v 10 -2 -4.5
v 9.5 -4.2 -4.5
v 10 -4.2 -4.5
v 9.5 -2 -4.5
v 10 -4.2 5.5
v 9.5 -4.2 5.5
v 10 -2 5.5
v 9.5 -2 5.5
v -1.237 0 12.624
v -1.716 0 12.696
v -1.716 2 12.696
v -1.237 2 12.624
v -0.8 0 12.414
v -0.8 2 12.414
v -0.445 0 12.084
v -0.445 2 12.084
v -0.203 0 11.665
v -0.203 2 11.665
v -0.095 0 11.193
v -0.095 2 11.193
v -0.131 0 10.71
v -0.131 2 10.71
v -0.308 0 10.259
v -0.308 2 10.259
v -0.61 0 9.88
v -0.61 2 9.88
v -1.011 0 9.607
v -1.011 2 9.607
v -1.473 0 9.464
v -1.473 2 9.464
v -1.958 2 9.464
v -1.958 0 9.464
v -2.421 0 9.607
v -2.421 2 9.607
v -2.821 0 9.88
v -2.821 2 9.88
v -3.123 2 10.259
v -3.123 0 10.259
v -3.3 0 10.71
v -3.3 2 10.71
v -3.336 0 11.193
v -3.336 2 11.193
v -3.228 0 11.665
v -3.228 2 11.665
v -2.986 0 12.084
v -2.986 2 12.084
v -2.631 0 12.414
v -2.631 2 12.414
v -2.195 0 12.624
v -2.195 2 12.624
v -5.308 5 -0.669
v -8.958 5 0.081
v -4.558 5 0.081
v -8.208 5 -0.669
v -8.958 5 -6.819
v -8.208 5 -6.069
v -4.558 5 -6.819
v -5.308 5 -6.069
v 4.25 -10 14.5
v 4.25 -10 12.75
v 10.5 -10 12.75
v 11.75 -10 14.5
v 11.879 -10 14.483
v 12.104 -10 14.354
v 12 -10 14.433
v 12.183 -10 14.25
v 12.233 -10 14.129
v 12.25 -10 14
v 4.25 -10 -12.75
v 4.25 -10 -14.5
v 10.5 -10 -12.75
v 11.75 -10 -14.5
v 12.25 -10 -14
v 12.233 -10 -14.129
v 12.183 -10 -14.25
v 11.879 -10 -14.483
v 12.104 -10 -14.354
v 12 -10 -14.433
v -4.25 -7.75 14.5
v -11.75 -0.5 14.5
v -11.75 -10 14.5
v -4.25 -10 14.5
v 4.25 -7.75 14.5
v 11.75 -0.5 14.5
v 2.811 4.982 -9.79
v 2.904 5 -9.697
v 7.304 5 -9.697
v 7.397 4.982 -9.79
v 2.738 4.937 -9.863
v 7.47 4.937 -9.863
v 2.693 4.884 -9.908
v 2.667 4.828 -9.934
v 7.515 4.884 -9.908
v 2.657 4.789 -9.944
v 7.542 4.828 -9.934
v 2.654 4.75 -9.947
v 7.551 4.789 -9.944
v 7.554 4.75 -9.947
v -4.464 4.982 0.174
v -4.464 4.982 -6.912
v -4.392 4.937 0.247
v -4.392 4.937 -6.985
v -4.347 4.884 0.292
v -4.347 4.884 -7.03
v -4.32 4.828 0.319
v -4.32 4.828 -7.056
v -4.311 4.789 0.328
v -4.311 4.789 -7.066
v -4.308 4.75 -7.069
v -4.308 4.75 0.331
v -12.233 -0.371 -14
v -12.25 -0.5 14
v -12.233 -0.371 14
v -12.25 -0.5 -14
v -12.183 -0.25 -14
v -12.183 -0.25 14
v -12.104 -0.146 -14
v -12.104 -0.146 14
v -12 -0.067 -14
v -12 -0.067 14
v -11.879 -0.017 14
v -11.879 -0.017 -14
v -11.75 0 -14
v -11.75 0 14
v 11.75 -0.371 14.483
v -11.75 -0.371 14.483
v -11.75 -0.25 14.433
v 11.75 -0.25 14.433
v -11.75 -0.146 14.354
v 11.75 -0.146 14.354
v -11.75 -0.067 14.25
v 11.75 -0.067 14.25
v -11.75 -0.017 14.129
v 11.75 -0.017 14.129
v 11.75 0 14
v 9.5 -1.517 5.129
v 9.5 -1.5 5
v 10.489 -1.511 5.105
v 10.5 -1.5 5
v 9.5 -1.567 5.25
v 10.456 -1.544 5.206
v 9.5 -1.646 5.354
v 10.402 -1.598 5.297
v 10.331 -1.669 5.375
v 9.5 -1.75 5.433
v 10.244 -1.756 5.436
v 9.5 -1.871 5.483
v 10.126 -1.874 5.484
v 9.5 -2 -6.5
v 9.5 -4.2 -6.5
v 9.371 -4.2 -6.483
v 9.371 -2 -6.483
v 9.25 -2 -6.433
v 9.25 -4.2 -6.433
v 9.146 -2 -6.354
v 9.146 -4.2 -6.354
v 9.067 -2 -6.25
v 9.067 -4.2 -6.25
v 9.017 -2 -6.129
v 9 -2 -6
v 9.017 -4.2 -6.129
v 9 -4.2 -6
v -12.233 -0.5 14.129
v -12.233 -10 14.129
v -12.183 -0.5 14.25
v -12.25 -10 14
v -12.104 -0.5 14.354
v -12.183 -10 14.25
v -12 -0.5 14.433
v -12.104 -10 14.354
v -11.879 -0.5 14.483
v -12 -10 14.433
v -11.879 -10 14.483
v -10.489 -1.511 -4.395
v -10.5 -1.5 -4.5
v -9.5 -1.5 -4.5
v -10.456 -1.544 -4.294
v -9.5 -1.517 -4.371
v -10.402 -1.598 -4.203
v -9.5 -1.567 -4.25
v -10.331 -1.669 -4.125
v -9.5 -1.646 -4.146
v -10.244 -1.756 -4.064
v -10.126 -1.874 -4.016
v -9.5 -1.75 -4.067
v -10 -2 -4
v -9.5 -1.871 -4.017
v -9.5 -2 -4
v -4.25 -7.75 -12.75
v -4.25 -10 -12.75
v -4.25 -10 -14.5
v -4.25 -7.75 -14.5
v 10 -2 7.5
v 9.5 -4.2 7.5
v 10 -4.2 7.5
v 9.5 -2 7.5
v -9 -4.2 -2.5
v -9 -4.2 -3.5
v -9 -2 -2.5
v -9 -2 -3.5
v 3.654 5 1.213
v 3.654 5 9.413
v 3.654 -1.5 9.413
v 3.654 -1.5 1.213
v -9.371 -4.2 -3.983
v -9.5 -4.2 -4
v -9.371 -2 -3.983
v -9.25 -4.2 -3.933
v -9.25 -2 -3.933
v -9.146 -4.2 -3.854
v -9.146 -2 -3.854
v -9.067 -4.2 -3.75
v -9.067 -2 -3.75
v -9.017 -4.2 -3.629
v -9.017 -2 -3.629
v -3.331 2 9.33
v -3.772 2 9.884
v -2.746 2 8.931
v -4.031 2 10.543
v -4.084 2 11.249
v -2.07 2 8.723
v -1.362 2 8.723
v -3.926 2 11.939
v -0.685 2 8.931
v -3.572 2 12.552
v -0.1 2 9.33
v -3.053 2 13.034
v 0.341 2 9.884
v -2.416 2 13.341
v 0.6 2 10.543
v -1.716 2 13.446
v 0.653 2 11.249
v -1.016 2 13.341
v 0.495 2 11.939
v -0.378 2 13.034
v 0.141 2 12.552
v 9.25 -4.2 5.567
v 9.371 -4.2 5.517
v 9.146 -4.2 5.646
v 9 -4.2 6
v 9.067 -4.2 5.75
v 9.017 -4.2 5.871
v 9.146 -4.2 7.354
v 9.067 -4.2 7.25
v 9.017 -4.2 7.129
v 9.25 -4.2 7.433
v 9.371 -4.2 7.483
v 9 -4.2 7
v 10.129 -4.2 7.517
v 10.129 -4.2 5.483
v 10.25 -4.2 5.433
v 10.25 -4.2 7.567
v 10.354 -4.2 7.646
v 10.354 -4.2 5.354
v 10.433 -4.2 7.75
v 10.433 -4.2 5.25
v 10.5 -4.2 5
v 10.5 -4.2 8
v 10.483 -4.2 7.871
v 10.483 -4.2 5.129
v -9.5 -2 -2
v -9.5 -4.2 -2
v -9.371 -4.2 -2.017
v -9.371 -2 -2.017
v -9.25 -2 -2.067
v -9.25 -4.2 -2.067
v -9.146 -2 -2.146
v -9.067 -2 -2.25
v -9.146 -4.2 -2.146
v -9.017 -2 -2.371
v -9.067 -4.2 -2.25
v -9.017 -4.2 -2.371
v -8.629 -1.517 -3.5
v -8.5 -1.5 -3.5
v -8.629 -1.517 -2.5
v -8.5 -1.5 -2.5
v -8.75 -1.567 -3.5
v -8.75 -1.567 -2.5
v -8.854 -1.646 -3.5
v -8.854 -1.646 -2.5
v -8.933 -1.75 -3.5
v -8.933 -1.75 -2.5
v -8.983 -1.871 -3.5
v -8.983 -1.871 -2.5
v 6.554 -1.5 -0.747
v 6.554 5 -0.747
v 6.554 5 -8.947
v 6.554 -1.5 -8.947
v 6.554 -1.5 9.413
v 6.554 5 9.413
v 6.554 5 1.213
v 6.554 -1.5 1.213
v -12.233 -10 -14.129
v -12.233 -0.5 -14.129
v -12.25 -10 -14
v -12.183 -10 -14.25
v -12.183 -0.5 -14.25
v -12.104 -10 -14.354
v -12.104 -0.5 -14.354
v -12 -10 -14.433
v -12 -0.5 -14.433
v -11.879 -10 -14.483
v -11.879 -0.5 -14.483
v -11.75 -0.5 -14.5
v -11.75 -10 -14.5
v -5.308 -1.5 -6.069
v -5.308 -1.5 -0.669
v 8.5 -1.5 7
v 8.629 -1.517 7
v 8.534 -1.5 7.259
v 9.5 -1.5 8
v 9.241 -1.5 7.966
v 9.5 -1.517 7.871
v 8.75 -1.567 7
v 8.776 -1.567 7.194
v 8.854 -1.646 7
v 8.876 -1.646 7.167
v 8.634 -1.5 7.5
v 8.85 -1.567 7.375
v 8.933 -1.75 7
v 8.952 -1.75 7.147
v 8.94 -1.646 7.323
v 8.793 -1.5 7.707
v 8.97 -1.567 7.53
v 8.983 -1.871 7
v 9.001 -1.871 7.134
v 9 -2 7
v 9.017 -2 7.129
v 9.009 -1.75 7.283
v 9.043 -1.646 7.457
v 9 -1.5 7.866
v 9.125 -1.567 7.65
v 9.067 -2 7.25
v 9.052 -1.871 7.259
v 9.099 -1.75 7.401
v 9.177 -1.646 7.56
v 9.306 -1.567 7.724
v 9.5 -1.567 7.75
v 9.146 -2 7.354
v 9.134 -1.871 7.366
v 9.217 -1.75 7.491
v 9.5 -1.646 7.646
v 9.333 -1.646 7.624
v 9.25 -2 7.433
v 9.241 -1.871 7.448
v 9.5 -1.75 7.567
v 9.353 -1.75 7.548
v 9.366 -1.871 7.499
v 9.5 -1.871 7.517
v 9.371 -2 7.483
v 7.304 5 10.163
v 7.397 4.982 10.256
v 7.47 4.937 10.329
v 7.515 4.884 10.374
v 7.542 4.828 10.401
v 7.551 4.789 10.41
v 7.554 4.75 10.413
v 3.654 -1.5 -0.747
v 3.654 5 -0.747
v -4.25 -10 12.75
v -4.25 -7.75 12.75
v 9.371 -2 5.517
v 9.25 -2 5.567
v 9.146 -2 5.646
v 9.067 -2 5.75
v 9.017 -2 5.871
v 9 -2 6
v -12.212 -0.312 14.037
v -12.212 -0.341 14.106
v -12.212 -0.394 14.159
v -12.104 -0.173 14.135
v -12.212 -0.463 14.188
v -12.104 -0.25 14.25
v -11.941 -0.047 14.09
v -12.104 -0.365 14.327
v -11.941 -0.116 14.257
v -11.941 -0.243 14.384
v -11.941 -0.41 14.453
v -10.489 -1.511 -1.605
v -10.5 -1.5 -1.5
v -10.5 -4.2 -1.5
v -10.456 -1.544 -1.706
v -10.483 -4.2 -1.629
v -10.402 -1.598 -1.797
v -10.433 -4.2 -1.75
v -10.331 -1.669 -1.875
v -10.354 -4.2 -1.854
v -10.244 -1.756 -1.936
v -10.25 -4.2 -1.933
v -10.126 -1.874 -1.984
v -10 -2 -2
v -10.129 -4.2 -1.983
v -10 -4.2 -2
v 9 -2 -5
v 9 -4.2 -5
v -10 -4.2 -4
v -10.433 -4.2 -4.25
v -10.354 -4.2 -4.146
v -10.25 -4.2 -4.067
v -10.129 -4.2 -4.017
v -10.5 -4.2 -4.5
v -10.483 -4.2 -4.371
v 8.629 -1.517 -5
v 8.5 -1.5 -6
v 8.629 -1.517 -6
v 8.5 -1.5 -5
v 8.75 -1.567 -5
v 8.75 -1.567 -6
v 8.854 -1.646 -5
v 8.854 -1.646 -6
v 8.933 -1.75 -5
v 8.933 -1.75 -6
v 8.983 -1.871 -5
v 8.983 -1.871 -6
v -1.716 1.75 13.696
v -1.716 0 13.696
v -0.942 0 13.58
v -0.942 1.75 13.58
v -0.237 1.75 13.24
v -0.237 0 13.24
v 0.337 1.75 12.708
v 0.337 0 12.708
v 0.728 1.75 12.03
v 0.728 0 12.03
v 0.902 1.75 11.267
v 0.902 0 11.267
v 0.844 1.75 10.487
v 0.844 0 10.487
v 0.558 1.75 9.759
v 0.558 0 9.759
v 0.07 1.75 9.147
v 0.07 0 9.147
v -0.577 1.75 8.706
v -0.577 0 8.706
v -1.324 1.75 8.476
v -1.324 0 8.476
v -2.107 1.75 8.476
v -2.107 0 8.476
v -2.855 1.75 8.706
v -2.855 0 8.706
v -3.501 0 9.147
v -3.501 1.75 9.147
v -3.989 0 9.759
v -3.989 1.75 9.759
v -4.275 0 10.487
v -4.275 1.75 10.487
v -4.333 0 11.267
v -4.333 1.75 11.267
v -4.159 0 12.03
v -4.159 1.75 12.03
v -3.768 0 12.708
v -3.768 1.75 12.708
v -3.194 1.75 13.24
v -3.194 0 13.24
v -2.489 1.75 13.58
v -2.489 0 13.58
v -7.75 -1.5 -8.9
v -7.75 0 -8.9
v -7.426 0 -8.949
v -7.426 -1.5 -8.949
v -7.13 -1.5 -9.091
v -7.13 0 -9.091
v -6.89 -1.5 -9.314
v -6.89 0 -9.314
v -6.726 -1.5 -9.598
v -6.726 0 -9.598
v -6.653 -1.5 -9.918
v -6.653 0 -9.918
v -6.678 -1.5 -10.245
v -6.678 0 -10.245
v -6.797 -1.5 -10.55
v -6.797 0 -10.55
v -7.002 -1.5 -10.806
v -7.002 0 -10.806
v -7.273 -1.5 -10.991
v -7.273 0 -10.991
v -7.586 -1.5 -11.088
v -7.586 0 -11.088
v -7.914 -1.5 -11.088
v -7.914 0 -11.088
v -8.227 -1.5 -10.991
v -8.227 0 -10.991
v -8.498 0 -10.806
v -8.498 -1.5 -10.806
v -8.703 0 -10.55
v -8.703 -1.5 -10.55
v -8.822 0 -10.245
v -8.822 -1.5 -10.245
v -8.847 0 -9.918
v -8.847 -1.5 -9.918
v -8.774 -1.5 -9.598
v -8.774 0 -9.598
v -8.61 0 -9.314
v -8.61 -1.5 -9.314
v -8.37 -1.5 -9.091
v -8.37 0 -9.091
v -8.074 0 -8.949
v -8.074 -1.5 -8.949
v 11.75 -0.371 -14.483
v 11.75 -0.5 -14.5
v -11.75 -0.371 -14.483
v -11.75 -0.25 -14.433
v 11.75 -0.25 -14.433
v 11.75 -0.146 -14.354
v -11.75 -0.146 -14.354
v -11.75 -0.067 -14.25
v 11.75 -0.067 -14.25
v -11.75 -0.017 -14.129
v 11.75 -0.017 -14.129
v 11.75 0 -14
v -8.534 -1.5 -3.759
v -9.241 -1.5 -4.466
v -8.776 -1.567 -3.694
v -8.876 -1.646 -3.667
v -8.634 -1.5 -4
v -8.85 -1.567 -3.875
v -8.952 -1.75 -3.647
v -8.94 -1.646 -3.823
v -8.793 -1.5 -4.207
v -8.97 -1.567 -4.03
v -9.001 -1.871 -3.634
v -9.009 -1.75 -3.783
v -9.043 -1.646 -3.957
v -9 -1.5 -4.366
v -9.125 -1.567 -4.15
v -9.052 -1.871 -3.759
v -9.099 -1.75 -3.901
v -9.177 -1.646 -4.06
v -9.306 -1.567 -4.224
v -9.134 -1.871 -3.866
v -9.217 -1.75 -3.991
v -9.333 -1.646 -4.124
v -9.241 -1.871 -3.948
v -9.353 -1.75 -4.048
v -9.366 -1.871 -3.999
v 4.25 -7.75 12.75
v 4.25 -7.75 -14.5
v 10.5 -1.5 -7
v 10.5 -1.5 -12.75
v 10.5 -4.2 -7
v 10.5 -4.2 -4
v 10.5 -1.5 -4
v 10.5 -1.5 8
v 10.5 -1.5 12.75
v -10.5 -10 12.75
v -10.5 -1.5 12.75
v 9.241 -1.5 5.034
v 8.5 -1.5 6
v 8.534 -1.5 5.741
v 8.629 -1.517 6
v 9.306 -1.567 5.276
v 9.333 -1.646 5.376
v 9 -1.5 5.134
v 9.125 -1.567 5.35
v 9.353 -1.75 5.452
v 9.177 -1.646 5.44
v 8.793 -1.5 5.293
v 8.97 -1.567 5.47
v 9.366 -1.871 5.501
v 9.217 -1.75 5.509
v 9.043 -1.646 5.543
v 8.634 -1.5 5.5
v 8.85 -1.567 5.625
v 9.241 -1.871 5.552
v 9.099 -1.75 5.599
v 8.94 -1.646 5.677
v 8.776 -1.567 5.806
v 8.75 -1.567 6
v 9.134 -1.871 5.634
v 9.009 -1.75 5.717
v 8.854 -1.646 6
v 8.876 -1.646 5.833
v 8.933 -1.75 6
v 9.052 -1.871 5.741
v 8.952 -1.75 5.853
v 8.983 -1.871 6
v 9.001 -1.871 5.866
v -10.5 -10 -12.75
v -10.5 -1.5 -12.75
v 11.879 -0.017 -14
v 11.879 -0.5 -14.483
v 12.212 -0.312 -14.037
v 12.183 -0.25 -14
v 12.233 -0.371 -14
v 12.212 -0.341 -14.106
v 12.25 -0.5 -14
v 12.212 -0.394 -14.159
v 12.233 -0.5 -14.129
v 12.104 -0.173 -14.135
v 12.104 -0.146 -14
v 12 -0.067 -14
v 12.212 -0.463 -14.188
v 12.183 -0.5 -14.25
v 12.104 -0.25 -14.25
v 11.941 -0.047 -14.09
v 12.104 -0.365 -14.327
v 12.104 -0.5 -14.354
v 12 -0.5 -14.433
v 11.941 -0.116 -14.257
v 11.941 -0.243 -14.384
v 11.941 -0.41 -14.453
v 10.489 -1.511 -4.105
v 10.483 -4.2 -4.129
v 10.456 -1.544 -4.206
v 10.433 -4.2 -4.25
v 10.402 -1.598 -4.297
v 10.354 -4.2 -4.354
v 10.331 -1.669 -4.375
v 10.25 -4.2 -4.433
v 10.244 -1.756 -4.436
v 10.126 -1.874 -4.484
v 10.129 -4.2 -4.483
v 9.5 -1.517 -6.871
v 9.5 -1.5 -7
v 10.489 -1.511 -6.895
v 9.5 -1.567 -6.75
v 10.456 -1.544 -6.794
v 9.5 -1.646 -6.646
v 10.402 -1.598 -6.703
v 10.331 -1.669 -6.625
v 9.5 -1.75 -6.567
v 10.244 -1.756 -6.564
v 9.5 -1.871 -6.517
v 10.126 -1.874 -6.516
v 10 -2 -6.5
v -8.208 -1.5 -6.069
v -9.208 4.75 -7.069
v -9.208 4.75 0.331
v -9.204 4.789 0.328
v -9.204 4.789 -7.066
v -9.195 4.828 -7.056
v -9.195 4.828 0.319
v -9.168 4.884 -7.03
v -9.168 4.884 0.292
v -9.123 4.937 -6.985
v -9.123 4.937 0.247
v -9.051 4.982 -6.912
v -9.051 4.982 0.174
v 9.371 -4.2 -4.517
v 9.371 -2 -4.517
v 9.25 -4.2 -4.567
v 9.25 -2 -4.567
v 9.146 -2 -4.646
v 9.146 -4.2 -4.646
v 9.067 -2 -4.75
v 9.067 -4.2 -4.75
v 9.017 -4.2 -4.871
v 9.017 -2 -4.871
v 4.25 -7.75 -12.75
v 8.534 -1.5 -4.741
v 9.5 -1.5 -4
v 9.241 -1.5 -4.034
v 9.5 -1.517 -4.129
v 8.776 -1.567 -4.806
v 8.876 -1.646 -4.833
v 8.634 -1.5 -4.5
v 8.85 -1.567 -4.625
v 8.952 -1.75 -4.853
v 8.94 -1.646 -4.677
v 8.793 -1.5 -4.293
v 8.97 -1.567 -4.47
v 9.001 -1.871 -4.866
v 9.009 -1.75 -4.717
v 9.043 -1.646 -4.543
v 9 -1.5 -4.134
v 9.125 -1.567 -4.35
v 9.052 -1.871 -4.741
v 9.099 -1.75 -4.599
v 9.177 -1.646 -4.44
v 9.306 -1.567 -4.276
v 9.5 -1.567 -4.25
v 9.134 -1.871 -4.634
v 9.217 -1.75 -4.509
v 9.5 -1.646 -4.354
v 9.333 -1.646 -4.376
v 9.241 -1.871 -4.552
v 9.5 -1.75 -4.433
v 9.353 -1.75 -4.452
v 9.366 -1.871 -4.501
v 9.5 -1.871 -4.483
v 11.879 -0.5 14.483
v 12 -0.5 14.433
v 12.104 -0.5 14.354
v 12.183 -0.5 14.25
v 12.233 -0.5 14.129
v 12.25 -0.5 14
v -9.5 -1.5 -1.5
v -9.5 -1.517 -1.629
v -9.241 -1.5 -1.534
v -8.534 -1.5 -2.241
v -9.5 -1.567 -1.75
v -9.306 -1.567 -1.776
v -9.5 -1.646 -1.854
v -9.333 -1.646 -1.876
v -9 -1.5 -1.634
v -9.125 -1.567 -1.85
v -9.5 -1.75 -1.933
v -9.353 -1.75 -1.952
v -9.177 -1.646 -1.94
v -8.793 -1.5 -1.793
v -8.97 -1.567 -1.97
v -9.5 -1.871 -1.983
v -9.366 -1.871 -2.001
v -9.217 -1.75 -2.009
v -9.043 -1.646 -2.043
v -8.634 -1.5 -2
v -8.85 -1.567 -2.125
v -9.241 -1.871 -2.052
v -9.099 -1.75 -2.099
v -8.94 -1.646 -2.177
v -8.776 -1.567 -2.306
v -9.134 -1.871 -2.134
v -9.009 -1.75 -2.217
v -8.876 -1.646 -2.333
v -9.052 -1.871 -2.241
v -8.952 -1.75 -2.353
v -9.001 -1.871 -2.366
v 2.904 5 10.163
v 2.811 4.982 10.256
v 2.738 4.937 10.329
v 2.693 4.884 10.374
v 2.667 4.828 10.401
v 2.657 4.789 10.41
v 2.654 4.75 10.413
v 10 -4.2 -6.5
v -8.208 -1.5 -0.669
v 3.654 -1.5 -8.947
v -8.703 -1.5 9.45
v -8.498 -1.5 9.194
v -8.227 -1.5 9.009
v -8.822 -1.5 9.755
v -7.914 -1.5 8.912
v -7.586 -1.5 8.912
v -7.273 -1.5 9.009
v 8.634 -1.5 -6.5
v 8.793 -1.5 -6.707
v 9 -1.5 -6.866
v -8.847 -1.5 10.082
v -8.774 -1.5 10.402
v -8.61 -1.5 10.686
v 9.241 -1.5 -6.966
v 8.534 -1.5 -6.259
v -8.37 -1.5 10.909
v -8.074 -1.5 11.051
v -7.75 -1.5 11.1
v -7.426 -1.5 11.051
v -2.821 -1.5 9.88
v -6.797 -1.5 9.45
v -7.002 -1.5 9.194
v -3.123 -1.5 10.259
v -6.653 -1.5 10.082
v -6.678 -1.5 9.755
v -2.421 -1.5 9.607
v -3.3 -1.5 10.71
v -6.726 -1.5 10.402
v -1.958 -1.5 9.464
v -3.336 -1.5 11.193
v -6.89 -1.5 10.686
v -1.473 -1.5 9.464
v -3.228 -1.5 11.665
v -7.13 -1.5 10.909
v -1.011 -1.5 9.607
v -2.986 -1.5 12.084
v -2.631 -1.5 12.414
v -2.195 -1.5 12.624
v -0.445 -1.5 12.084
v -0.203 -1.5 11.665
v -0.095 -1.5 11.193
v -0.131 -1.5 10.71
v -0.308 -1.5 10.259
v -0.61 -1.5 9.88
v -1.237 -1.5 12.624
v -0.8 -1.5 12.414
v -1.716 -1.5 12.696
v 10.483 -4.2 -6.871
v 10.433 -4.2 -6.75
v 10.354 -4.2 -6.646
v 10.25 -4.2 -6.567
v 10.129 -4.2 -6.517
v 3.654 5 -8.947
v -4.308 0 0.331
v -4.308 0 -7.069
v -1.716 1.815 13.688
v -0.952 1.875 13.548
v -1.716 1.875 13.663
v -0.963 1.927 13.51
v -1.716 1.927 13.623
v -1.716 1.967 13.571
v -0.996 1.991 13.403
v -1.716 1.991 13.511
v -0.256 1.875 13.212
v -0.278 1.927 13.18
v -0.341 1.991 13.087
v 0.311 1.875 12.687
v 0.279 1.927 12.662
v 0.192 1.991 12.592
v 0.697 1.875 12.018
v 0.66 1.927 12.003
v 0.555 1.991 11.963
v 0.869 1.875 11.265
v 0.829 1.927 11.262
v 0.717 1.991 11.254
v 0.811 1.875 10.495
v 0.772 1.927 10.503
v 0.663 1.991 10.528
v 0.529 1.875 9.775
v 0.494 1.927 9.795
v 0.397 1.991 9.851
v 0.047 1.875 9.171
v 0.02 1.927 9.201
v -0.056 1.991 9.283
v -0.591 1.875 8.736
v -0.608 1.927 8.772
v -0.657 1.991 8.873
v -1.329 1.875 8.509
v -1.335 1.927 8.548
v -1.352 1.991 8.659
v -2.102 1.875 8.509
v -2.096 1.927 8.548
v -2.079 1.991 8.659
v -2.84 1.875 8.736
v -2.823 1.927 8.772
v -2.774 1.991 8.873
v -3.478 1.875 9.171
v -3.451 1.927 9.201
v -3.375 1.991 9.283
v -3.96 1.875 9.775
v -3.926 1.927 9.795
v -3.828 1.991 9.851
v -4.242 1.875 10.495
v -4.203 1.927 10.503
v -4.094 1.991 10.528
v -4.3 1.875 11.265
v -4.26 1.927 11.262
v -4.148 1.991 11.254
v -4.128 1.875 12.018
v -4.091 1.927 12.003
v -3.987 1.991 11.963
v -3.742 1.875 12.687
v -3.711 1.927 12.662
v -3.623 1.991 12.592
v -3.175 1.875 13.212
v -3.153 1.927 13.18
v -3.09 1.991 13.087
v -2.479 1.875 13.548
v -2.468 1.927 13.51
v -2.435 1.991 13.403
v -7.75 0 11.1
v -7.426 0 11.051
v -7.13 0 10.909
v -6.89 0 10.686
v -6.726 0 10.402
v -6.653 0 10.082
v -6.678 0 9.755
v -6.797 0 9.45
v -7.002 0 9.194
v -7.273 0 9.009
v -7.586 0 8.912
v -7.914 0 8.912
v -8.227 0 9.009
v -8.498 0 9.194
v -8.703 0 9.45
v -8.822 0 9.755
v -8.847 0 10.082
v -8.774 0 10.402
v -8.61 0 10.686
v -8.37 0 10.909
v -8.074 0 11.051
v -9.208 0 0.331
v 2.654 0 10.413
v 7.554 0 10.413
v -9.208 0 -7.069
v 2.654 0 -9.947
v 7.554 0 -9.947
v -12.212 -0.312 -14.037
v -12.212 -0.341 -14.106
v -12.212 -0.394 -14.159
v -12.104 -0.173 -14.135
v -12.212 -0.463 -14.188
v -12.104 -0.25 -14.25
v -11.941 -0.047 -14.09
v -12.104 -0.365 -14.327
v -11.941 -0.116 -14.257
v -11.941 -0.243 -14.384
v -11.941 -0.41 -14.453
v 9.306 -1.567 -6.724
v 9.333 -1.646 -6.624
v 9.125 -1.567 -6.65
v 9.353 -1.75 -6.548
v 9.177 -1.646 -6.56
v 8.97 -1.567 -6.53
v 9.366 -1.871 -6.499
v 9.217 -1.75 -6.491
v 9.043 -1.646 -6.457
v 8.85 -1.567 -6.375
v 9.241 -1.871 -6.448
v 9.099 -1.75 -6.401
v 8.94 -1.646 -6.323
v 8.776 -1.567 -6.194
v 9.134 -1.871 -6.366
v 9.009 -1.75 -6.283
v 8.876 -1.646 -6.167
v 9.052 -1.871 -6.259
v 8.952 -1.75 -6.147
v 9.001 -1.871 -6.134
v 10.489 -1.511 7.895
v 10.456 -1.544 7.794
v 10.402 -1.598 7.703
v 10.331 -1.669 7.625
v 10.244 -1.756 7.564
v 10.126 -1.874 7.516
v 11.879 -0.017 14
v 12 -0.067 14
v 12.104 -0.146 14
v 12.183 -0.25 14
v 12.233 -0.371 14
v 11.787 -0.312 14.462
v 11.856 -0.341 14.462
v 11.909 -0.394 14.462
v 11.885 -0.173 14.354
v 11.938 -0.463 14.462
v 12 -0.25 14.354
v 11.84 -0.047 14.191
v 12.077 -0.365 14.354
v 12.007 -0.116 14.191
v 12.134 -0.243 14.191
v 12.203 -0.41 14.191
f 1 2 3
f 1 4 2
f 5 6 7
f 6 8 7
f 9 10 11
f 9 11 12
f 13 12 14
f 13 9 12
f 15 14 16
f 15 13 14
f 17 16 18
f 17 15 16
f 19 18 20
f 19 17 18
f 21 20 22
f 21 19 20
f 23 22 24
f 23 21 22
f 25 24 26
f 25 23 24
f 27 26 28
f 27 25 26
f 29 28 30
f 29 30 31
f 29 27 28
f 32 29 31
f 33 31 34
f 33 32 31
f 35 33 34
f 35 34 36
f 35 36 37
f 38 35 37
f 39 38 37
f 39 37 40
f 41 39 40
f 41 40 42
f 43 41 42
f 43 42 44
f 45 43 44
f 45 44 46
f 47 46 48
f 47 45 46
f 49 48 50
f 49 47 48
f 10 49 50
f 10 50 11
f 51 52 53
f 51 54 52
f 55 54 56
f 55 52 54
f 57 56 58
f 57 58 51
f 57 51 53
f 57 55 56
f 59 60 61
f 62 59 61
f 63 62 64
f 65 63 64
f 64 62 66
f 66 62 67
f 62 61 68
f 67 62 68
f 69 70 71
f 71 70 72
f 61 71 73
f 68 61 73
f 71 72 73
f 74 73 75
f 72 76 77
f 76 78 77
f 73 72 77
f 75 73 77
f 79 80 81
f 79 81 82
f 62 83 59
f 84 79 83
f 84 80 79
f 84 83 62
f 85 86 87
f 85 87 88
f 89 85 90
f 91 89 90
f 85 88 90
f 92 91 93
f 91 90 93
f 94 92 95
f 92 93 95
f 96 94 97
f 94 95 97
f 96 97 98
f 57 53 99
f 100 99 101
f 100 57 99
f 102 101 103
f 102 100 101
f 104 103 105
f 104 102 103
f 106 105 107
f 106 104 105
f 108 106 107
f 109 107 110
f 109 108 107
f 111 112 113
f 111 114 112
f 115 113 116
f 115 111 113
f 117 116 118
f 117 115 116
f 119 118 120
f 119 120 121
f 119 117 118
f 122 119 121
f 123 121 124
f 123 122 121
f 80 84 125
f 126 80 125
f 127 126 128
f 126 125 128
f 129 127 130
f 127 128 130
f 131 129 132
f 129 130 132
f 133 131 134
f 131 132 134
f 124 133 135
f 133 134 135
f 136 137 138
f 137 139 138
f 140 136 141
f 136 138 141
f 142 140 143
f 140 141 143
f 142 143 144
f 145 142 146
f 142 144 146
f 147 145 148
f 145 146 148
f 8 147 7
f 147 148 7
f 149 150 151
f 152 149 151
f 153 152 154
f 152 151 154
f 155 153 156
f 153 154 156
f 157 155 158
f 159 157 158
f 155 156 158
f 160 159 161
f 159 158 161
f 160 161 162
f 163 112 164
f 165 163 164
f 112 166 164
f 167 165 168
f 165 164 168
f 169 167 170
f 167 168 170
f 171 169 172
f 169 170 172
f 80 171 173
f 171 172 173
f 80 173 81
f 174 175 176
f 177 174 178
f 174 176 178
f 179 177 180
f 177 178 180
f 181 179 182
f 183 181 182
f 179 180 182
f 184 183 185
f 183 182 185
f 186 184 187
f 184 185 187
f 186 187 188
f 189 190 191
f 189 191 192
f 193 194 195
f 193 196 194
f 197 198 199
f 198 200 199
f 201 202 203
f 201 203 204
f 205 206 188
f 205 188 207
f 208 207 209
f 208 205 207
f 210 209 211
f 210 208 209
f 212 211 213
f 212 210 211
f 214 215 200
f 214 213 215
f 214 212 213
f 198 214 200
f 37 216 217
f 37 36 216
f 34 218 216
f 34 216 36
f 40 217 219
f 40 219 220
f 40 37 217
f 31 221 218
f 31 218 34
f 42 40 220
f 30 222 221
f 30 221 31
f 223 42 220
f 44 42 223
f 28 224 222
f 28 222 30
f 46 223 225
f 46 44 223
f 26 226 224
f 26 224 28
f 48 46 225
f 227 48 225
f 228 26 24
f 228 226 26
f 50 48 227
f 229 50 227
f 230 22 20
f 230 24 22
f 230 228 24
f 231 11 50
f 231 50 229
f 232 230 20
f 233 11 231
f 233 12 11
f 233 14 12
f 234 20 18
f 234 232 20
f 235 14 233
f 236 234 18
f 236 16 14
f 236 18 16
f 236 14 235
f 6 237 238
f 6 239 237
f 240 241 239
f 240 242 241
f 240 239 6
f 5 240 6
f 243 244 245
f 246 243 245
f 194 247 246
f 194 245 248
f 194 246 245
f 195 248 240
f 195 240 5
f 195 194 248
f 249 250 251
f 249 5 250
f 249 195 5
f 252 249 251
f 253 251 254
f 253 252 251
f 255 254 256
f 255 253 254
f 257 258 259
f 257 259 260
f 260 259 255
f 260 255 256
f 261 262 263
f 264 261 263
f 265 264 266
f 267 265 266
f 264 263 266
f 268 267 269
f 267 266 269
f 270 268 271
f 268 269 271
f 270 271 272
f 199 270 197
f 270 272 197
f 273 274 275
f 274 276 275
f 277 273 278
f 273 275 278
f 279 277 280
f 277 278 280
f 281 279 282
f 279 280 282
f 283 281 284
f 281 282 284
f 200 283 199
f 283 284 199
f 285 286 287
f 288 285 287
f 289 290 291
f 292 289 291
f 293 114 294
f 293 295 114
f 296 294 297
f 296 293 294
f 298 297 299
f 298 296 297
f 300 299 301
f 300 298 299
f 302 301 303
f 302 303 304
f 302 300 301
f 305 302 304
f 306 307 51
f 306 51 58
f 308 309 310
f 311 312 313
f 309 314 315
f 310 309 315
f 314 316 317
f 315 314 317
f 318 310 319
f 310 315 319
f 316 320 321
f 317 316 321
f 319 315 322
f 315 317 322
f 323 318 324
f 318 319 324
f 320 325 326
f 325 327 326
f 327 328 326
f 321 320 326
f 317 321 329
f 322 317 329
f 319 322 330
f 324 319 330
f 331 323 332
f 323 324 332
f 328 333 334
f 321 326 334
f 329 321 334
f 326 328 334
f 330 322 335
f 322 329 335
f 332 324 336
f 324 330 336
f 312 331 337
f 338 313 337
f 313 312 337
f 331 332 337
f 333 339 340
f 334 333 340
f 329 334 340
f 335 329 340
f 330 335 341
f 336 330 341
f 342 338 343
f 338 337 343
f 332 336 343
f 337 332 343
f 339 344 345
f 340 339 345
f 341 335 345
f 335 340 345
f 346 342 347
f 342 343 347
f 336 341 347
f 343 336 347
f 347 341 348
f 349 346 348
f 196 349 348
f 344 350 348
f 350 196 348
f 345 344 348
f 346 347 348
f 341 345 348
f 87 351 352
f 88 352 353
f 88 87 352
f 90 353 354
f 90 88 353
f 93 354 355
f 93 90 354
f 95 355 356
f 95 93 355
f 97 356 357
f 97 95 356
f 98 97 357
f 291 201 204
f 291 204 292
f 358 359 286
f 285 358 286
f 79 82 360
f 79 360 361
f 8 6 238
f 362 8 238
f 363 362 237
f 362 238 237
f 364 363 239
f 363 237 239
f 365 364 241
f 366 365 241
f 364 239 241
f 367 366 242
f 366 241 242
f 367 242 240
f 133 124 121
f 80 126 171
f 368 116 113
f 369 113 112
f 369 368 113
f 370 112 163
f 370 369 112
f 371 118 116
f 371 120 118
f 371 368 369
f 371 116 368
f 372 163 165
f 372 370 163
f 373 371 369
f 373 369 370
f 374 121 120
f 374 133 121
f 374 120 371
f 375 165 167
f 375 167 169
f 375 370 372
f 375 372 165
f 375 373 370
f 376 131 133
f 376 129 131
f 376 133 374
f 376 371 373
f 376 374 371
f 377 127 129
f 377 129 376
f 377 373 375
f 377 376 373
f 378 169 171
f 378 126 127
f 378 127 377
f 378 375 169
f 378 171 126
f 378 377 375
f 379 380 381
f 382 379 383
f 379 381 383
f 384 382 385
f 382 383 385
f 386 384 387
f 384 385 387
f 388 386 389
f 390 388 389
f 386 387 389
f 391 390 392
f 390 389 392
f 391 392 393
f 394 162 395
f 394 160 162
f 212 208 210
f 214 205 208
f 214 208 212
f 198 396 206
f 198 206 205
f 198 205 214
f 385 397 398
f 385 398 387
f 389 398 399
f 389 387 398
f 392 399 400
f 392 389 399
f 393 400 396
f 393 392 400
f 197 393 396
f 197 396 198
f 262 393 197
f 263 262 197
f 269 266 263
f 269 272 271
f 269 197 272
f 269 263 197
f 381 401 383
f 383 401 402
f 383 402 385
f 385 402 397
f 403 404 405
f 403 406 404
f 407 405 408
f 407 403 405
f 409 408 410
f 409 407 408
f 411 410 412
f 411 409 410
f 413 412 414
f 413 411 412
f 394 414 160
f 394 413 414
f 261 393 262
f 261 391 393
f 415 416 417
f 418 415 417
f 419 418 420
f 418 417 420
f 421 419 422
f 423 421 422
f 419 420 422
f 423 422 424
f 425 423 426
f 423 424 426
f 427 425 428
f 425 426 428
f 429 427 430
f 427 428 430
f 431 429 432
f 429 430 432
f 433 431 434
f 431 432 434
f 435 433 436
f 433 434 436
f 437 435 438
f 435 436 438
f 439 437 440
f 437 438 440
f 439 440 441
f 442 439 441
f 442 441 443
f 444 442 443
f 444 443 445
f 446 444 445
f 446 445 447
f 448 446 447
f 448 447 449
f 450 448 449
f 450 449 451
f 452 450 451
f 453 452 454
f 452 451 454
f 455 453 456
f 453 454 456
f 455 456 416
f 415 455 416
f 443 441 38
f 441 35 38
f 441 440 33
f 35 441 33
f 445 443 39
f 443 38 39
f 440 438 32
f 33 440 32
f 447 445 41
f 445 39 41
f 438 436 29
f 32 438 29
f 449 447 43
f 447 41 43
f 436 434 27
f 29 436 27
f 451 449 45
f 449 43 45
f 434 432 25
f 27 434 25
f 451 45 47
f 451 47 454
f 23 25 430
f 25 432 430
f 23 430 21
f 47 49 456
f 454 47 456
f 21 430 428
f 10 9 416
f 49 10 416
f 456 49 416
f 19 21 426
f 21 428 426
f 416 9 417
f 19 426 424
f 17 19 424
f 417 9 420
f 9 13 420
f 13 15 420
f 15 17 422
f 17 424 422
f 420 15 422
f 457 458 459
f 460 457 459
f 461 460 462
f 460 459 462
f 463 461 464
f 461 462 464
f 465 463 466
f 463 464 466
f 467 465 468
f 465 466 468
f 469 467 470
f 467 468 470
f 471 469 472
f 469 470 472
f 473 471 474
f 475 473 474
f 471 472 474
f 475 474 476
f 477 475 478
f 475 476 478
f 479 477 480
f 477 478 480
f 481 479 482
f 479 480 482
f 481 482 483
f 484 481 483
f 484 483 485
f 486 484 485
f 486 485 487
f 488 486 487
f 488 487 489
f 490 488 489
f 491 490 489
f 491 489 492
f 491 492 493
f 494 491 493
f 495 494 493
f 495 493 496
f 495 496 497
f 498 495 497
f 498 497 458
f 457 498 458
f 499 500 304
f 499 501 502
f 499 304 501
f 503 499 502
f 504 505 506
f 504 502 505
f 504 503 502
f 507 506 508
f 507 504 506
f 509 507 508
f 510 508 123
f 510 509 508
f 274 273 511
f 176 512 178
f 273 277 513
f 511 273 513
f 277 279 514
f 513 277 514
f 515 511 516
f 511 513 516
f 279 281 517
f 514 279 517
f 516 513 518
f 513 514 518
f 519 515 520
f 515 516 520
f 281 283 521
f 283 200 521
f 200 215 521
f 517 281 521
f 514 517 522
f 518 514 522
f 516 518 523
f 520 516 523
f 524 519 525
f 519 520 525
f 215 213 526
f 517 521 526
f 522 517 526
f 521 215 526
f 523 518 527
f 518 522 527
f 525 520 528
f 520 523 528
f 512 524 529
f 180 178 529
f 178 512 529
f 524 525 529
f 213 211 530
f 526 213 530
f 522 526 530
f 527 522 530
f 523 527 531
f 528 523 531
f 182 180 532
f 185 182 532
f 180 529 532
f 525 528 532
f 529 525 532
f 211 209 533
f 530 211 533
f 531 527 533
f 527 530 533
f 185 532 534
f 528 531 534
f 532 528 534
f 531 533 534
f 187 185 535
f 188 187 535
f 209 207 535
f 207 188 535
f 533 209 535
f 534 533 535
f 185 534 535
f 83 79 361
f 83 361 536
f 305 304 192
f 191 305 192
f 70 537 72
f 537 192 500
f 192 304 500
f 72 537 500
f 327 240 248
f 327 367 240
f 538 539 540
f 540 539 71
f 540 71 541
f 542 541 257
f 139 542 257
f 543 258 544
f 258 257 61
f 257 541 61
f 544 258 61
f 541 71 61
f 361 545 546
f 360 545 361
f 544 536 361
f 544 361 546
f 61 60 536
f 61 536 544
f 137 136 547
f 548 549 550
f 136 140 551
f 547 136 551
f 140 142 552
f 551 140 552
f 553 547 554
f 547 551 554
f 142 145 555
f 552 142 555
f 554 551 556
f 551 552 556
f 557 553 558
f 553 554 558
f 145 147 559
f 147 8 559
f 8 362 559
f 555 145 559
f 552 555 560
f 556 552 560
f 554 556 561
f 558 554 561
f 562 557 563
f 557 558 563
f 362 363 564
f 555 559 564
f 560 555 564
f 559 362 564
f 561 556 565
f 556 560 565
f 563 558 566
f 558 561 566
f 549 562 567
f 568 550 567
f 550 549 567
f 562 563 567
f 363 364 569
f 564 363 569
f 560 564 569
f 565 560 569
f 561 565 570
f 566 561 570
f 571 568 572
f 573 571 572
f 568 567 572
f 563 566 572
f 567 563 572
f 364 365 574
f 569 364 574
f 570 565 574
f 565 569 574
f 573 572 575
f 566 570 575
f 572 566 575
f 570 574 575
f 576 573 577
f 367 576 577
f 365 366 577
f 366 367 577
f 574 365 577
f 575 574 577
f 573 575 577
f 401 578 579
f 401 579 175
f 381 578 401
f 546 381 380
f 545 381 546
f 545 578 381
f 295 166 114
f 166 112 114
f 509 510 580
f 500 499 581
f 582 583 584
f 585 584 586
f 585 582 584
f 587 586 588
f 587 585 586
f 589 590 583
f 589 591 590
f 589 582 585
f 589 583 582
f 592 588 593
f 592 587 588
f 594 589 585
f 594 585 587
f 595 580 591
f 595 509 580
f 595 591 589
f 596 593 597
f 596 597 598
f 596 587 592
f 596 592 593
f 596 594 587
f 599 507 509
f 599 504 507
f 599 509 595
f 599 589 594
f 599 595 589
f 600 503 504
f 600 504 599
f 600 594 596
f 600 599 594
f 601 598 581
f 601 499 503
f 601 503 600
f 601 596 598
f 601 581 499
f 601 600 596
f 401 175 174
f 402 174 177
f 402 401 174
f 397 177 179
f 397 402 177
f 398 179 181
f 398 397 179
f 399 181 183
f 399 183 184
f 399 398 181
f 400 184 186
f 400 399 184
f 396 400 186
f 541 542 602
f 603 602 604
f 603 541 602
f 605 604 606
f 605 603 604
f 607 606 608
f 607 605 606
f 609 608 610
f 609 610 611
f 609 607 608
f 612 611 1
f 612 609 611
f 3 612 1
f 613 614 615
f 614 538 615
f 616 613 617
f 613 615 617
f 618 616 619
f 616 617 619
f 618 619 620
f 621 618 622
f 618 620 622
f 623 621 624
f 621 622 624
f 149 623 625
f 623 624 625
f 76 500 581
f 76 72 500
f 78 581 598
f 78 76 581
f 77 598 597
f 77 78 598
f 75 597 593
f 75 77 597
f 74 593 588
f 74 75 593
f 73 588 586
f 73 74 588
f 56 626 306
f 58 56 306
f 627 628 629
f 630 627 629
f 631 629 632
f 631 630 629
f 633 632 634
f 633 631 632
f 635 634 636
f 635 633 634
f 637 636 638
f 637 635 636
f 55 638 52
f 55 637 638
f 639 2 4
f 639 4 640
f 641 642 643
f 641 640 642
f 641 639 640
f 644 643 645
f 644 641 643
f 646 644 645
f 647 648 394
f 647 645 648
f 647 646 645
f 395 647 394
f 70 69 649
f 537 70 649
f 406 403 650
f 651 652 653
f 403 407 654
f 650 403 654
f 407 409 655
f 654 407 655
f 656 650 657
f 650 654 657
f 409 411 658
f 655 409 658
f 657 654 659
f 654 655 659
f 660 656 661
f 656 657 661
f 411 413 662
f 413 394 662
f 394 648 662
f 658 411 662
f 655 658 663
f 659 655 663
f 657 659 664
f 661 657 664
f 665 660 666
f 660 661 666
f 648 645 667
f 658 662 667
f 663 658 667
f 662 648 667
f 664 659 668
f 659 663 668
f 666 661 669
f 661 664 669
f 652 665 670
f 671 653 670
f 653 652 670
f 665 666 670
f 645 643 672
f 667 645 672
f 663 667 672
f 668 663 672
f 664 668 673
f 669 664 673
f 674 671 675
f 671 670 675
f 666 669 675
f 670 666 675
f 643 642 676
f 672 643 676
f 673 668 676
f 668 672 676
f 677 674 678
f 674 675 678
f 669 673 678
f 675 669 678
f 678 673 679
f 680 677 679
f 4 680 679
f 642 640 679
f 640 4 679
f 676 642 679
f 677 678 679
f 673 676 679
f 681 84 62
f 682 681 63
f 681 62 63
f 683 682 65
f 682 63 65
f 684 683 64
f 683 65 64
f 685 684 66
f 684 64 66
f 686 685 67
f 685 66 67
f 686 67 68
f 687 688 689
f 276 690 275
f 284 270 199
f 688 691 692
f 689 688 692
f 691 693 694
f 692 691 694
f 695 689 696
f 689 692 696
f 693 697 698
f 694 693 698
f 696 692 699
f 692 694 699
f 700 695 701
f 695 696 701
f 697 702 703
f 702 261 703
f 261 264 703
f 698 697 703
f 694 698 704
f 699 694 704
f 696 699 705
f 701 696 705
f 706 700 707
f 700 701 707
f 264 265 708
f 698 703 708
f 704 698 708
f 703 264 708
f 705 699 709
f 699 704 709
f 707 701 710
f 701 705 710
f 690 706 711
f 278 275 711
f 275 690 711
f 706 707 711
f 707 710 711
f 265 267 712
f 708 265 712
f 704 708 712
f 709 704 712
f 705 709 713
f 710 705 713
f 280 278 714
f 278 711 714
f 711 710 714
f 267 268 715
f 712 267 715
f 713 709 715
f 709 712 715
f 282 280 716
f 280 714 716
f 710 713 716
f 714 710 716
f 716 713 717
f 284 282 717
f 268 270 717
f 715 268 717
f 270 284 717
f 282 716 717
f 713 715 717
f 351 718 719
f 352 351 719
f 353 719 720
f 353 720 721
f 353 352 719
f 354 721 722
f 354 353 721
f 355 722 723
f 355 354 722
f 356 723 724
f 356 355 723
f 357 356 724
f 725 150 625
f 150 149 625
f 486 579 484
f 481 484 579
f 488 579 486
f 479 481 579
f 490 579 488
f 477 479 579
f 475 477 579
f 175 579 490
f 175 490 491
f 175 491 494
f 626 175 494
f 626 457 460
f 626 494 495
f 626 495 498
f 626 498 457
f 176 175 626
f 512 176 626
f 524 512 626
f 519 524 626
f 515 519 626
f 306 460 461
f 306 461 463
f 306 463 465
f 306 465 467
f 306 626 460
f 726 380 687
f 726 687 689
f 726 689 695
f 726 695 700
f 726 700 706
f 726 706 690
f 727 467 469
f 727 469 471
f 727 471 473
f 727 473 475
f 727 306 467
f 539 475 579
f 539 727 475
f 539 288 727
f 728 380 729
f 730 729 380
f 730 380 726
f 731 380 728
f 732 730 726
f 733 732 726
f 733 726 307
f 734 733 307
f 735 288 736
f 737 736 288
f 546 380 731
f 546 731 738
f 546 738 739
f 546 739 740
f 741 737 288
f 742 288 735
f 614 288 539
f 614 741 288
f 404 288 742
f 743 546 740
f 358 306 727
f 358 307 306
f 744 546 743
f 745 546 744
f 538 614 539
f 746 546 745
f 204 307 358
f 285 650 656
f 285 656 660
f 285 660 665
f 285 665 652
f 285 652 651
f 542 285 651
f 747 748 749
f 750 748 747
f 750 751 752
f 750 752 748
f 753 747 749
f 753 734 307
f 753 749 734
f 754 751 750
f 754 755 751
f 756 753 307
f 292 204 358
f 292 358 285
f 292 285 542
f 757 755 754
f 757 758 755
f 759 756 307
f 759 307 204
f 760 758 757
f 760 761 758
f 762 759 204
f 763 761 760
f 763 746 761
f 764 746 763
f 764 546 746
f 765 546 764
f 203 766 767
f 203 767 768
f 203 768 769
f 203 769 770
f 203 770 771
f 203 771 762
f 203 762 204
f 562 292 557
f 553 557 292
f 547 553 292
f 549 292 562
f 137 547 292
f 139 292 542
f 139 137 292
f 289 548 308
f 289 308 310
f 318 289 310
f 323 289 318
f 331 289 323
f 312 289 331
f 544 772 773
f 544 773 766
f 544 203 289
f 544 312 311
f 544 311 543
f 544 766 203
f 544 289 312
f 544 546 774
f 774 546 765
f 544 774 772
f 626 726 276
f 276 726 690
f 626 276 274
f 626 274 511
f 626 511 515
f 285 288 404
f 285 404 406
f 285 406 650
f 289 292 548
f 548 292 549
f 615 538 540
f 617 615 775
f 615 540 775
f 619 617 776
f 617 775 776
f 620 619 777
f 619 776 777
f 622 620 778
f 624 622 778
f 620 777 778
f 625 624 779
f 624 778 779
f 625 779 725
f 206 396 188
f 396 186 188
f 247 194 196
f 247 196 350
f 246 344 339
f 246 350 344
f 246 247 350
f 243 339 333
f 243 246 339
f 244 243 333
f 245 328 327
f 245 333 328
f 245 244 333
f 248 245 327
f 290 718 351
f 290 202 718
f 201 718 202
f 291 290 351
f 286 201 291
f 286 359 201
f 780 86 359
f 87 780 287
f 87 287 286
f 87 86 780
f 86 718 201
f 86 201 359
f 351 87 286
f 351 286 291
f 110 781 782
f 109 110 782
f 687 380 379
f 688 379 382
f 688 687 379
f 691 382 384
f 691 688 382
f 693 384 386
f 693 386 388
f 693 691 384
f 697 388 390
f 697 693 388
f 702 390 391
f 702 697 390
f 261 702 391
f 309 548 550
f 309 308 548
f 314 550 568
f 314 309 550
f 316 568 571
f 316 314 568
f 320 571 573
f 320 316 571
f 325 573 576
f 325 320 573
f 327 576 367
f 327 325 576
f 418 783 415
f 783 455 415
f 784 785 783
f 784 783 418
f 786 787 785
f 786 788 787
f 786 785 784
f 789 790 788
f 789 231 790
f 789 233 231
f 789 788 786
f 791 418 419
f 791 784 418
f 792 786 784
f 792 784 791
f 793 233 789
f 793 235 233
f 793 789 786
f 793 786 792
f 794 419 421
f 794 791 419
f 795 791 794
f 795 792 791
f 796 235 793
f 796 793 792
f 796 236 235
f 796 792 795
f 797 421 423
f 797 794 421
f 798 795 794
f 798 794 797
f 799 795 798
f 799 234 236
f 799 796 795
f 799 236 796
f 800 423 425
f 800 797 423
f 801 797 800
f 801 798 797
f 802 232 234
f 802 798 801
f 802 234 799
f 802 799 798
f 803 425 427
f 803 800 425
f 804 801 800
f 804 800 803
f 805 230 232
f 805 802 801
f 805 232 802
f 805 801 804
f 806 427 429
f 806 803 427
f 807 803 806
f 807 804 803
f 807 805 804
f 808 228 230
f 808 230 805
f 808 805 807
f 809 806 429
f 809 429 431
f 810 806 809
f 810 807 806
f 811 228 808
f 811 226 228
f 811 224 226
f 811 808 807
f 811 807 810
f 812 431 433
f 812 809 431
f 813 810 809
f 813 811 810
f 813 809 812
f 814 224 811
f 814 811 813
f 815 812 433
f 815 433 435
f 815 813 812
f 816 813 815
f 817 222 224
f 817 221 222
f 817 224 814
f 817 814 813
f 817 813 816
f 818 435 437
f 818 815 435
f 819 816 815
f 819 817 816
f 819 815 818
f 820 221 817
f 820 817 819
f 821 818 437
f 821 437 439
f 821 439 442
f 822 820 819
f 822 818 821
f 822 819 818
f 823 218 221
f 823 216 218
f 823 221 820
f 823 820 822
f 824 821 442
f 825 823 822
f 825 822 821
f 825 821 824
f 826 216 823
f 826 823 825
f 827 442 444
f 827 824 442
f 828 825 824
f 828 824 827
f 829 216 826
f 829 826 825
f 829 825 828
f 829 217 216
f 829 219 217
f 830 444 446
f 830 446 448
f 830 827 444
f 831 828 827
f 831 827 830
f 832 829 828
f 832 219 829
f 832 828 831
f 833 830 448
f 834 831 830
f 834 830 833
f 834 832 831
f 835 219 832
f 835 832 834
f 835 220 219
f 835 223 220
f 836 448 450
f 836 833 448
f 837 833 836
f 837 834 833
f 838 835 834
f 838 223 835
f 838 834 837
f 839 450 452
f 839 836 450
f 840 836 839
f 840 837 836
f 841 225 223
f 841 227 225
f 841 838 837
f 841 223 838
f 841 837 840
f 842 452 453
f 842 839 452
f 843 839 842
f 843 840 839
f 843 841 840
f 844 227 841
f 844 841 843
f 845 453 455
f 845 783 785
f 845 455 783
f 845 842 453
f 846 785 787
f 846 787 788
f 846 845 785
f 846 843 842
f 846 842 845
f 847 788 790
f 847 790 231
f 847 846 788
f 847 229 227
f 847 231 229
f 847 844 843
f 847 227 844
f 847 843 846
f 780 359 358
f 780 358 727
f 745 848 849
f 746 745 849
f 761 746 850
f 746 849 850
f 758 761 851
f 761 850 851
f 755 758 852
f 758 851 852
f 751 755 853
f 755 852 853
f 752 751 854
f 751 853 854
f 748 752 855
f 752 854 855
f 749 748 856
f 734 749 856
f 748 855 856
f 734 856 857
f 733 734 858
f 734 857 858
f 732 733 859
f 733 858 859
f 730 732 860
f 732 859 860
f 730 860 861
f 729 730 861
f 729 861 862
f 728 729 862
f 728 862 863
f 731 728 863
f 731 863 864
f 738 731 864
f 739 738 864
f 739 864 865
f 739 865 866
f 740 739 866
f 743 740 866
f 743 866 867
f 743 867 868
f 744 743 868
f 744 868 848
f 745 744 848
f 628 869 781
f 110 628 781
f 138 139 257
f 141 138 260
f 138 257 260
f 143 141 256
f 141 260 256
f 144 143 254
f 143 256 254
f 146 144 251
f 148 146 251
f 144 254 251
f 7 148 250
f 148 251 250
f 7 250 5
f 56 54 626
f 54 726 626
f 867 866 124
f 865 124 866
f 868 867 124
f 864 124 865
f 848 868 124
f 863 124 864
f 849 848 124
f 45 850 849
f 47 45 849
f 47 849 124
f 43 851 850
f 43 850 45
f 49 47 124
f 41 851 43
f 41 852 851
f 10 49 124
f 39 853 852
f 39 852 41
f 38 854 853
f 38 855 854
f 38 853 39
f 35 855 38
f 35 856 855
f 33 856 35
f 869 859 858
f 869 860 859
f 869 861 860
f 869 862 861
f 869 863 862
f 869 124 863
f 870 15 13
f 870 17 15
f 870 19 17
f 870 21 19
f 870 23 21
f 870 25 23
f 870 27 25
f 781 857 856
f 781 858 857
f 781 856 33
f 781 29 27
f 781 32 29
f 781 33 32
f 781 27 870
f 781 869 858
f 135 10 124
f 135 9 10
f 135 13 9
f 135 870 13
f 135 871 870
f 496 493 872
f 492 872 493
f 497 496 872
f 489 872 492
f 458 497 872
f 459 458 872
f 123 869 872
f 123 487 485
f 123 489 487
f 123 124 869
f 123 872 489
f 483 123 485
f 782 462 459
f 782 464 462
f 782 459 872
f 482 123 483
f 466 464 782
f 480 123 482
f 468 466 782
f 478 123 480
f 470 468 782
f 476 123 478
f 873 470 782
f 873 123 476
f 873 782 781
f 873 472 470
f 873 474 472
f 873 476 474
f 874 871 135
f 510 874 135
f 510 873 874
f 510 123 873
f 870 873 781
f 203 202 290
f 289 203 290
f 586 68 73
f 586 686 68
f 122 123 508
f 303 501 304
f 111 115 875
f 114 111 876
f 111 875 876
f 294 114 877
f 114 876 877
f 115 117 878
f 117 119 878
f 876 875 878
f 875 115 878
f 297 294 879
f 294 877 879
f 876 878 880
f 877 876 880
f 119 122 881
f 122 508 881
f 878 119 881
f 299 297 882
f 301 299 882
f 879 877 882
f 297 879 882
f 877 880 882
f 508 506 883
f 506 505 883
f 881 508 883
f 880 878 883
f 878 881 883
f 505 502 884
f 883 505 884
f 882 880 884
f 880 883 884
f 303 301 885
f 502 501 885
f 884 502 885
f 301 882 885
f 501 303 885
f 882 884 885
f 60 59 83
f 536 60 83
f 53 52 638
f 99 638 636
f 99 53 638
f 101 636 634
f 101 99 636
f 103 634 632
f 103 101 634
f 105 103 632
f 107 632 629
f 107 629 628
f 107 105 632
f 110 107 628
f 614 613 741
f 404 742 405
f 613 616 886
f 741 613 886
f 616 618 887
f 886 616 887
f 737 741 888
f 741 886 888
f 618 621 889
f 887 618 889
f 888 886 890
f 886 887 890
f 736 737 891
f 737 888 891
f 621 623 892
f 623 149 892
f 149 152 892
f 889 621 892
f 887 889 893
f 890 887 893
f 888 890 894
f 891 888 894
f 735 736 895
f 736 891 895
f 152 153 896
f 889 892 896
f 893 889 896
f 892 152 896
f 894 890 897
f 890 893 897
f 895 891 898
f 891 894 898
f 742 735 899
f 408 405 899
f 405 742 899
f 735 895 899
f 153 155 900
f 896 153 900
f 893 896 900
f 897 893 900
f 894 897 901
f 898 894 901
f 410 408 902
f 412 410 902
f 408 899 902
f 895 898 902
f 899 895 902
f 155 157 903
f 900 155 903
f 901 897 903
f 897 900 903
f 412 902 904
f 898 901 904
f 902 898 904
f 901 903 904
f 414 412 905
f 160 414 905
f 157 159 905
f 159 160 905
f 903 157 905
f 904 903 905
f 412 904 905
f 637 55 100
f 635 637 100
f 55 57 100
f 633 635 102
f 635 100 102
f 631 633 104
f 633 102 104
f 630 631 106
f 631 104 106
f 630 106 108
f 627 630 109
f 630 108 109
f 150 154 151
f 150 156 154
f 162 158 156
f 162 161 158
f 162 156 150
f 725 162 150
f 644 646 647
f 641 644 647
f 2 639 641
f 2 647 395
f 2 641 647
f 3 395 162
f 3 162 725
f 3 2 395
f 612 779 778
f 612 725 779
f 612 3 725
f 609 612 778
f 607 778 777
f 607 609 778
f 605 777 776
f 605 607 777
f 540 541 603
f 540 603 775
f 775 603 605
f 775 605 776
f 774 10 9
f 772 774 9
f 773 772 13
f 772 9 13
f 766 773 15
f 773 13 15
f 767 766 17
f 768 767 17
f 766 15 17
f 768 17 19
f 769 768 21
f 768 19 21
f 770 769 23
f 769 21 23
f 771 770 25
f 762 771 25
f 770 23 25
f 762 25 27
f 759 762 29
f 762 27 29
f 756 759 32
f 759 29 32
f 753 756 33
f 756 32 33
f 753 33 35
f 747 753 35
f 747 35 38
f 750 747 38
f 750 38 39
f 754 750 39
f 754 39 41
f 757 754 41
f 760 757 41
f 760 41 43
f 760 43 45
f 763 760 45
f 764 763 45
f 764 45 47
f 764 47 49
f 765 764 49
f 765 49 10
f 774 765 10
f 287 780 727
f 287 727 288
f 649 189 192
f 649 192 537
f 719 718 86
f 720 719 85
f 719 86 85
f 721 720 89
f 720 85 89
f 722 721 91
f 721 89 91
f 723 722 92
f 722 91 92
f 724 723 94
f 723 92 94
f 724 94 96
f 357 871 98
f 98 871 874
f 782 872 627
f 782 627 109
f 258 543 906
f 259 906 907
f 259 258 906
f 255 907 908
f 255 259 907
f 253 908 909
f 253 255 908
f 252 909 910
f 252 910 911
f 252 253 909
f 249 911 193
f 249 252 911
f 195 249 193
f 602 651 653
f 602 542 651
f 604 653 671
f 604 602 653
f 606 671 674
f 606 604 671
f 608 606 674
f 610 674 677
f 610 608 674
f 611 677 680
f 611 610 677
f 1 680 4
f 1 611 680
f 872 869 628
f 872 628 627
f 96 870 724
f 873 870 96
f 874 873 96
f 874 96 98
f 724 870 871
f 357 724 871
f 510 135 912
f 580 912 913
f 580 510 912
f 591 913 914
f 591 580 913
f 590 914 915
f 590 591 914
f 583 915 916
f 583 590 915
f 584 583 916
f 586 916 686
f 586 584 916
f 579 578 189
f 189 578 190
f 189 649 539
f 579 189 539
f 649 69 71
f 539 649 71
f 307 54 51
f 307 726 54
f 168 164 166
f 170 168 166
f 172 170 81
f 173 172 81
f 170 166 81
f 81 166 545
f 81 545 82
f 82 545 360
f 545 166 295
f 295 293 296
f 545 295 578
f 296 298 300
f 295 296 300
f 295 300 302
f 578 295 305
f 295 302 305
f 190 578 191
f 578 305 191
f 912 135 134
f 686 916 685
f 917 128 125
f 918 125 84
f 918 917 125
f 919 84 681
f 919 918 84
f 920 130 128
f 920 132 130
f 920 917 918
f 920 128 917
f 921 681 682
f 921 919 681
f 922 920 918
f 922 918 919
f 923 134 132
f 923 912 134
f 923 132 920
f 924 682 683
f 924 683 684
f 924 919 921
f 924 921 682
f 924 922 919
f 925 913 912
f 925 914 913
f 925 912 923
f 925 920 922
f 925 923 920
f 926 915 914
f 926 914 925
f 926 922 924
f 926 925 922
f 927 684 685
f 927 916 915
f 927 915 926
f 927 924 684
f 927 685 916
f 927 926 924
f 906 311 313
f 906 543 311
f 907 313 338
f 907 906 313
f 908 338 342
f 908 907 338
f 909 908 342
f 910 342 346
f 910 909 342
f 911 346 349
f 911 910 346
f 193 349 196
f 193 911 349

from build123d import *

# Parameters (mm, degrees)
SKETCH2_W           = 24.5
SKETCH2_H           = 29
BOSS_EXTRUDE1_DEPTH = 10
SKETCH3_W           = 21
SKETCH3_H           = 25.5
CUT_EXTRUDE1_DEPTH  = 8.5
SKETCH4_R           = 1.1
SKETCH4_R_2         = 1.625
SKETCH4_W           = 2.9
SKETCH4_H           = 5.4
SKETCH4_H_2         = 8.2
CUT_EXTRUDE2_DEPTH  = 22.454894546
SKETCH5_W           = 8.5
SKETCH5_H           = 2.25
CUT_EXTRUDE3_DEPTH  = 34.031235218
FILLET1_R           = 0.5
SKETCH6_W           = 1.5
SKETCH6_H           = 2
BOSS_EXTRUDE2_DEPTH = 2.7
FILLET2_R           = 0.5
SKETCH7_W           = 4.9
SKETCH7_H           = 7.4
SKETCH7_W_2         = 2.9
SKETCH7_H_2         = 5.4
SKETCH7_H_3         = 20.36
SKETCH7_H_4         = 8.2
BOSS_EXTRUDE3_DEPTH = 5
SKETCH8_R           = 2.625
SKETCH8_R_2         = 1.625
BOSS_EXTRUDE4_DEPTH = 2
FILLET3_R           = 0.25
FILLET4_R           = 0.25


with BuildPart() as part:
    # Sketch2 → Boss-Extrude1 (new body)
    with BuildSketch(Plane(origin=(0, 0, 0), x_dir=(1, 0, 0), z_dir=(0, 1, 0))):
        Rectangle(SKETCH2_W, SKETCH2_H)
    extrude(amount=-BOSS_EXTRUDE1_DEPTH)

    # Sketch3 → Cut-Extrude1 (cut)
    with BuildSketch(Plane.XZ.offset(10)):
        Rectangle(SKETCH3_W, SKETCH3_H)
    extrude(amount=-CUT_EXTRUDE1_DEPTH, mode=Mode.SUBTRACT)

    # Sketch4 → Cut-Extrude2 (cut, through all)
    with BuildSketch(Plane(origin=(0, 0, 0), x_dir=(1, 0, 0), z_dir=(0, 1, 0))):
        with Locations(Location((-7.75, -10, 0), (0, 0, 270))):
            Circle(SKETCH4_R)
        with Locations(Location((-7.75, 10, 0), (0, 0, 270))):
            Circle(SKETCH4_R)
        with Locations(Location((-1.7156, -11.0712, 0), (0, 0, 270))):
            Circle(SKETCH4_R_2)
        with Locations((-6.7576, 3.3688)):
            Rectangle(SKETCH4_W, SKETCH4_H)
        with Locations((5.1042, 4.84677)):
            Rectangle(SKETCH4_W, SKETCH4_H_2)
        with Locations((5.1042, -5.31323)):
            Rectangle(SKETCH4_W, SKETCH4_H_2)
    extrude(amount=-CUT_EXTRUDE2_DEPTH, mode=Mode.SUBTRACT)

    # Sketch5 → Cut-Extrude3 (cut, through all)
    with BuildSketch(Plane.XY.offset(14.5)):
        with Locations((0, -8.875)):
            Rectangle(SKETCH5_W, SKETCH5_H)
    extrude(amount=-CUT_EXTRUDE3_DEPTH, mode=Mode.SUBTRACT)

    # Fillet1
    fillet1_edges = [part.edges().sort_by_distance(p)[0] for p in [
        (0, 0, -14.5),
        (12.25, 0, 0),
        (0, 0, 14.5),
        (-12.25, 0, 0),
        (-12.25, -5, -14.5),
        (12.25, -5, -14.5),
        (12.25, -5, 14.5),
        (-12.25, -5, 14.5),
    ]]
    fillet(fillet1_edges, radius=FILLET1_R)

    # Sketch6 → Boss-Extrude2 (add)
    with BuildSketch(Plane.XZ.offset(1.5)):
        with Locations((-9.75, -3)):
            Rectangle(SKETCH6_W, SKETCH6_H)
        with Locations((9.75, 6.5)):
            Rectangle(SKETCH6_W, SKETCH6_H)
        with Locations((9.75, -5.5)):
            Rectangle(SKETCH6_W, SKETCH6_H)
    extrude(amount=BOSS_EXTRUDE2_DEPTH)

    # Fillet2
    fillet2_edges = [part.edges().sort_by_distance(p)[0] for p in [
        (-9.75, -1.5, -2),
        (9.75, -1.5, -6.5),
        (9.75, -1.5, 5.5),
        (-9, -1.5, -3),
        (9, -1.5, -5.5),
        (9, -1.5, 6.5),
        (-9.75, -1.5, -4),
        (-10.5, -2.85, -4),
        (-9, -2.85, -4),
        (-9, -2.85, -2),
        (-10.5, -2.85, -2),
        (9.75, -1.5, -4.5),
        (10.5, -2.85, -4.5),
        (9, -2.85, -4.5),
        (9, -2.85, -6.5),
        (10.5, -2.85, -6.5),
        (9.75, -1.5, 7.5),
        (10.5, -2.85, 7.5),
        (9, -2.85, 7.5),
        (9, -2.85, 5.5),
        (10.5, -2.85, 5.5),
    ]]
    fillet(fillet2_edges, radius=FILLET2_R)

    # Sketch7 → Boss-Extrude3 (add)
    # profile 1 of 2: a face of its own
    with BuildSketch(Plane(origin=(0, 0, 0), x_dir=(1, 0, 0), z_dir=(0, 1, 0))):
        with Locations((-6.7576, 3.3688)):
            Rectangle(SKETCH7_W, SKETCH7_H)
        with Locations((-6.7576, 3.3688)):
            Rectangle(SKETCH7_W_2, SKETCH7_H_2, mode=Mode.SUBTRACT)
    # profile 2 of 2: a face of its own
    with BuildSketch(Plane(origin=(0, 0, 0), x_dir=(1, 0, 0), z_dir=(0, 1, 0))):
        with Locations((5.1042, -0.23323)):
            Rectangle(SKETCH7_W, SKETCH7_H_3)
        with Locations((5.1042, -5.31323)):
            Rectangle(SKETCH7_W_2, SKETCH7_H_4, mode=Mode.SUBTRACT)
        with Locations((5.1042, 4.84677)):
            Rectangle(SKETCH7_W_2, SKETCH7_H_4, mode=Mode.SUBTRACT)
    extrude(amount=BOSS_EXTRUDE3_DEPTH)

    # Fillet3
    fillet3_edges = [part.edges().sort_by_distance(p)[0] for p in [
        (-6.7576, 5, 0.3312),
        (-4.3076, 5, -3.3688),
        (-6.7576, 5, -7.0688),
        (-9.2076, 5, -3.3688),
        (2.6542, 5, 0.23323),
        (5.1042, 5, 10.41323),
        (7.5542, 5, 0.23323),
        (5.1042, 5, -9.94677),
    ]]
    fillet(fillet3_edges, radius=FILLET3_R)


with BuildPart() as body_2:
    # Sketch8 → Boss-Extrude4 (new body)
    with BuildSketch(Plane(origin=(0, 0, 0), x_dir=(1, 0, 0), z_dir=(0, 1, 0))):
        with Locations(Location((-1.7156, -11.0712, 0), (0, 0, 270))):
            Circle(SKETCH8_R)
        with Locations(Location((-1.7156, -11.0712, 0), (0, 0, 270))):
            Circle(SKETCH8_R_2, mode=Mode.SUBTRACT)
    extrude(amount=BOSS_EXTRUDE4_DEPTH)

    # Fillet4
    fillet4_edges = [body_2.edges().sort_by_distance(p)[0] for p in [
        (-1.7156, 2, 8.4462),
    ]]
    fillet(fillet4_edges, radius=FILLET4_R)


solid = Compound([part.part, body_2.part])
